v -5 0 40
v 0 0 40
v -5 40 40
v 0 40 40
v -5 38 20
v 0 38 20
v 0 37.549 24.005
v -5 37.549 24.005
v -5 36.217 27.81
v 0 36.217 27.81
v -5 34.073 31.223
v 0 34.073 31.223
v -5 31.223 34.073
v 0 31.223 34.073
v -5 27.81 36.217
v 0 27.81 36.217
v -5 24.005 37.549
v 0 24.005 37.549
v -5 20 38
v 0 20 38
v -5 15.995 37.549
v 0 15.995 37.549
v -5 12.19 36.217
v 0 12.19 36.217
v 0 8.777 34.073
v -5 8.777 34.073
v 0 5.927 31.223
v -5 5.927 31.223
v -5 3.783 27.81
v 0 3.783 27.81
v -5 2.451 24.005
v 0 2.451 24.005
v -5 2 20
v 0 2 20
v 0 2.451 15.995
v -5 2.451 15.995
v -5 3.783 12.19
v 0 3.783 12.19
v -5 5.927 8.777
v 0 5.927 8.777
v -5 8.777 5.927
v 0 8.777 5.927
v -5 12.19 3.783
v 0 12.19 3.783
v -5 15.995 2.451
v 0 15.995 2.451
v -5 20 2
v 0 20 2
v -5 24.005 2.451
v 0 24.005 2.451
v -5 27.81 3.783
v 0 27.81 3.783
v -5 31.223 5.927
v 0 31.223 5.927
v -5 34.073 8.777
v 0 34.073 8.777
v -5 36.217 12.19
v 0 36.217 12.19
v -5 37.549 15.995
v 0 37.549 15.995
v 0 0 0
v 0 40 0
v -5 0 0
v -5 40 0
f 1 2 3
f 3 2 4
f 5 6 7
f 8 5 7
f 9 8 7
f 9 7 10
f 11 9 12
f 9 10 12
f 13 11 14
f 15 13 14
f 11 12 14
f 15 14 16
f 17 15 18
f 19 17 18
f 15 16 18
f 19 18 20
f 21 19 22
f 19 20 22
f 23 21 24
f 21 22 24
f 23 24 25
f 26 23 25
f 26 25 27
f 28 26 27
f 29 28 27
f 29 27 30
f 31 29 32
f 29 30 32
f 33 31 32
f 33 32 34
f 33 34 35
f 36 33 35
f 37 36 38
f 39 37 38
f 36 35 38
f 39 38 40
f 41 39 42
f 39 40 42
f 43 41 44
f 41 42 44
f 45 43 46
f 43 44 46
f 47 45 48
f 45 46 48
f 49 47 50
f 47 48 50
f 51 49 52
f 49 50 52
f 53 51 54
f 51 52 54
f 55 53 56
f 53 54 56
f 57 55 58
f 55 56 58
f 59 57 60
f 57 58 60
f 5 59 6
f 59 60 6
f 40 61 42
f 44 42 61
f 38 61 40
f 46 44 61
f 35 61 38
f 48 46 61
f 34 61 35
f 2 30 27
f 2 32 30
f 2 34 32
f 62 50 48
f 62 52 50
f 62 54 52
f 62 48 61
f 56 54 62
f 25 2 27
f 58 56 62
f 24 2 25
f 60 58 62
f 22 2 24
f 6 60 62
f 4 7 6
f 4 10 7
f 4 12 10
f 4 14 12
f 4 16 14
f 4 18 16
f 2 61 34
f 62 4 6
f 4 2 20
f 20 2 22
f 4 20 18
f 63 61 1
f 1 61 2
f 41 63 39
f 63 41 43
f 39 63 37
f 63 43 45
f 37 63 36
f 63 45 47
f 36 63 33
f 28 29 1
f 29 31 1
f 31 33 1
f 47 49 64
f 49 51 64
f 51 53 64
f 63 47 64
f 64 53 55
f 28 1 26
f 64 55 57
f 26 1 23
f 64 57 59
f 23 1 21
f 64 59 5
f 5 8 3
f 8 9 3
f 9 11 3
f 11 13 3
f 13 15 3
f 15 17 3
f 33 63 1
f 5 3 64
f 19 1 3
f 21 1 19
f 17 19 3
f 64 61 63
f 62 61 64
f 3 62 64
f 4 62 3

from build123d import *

# Parameters (mm, degrees)
F0_W     = 40
F0_H     = 40
F1_DEPTH = 5
F2_R     = 18
F3_DEPTH = 5


with BuildPart() as f1:
    # F0 (on Right) → F1 (new body)
    with BuildSketch(Plane.YZ):
        with Locations((20, 20)):
            Rectangle(F0_W, F0_H)
    extrude(amount=-F1_DEPTH)

    # F2 (on face) → F3 (cut, through all)
    with BuildSketch(Plane.YZ):
        with Locations((20, 20)):
            Circle(F2_R)
    extrude(amount=-F3_DEPTH, mode=Mode.SUBTRACT)


solid = f1.part
